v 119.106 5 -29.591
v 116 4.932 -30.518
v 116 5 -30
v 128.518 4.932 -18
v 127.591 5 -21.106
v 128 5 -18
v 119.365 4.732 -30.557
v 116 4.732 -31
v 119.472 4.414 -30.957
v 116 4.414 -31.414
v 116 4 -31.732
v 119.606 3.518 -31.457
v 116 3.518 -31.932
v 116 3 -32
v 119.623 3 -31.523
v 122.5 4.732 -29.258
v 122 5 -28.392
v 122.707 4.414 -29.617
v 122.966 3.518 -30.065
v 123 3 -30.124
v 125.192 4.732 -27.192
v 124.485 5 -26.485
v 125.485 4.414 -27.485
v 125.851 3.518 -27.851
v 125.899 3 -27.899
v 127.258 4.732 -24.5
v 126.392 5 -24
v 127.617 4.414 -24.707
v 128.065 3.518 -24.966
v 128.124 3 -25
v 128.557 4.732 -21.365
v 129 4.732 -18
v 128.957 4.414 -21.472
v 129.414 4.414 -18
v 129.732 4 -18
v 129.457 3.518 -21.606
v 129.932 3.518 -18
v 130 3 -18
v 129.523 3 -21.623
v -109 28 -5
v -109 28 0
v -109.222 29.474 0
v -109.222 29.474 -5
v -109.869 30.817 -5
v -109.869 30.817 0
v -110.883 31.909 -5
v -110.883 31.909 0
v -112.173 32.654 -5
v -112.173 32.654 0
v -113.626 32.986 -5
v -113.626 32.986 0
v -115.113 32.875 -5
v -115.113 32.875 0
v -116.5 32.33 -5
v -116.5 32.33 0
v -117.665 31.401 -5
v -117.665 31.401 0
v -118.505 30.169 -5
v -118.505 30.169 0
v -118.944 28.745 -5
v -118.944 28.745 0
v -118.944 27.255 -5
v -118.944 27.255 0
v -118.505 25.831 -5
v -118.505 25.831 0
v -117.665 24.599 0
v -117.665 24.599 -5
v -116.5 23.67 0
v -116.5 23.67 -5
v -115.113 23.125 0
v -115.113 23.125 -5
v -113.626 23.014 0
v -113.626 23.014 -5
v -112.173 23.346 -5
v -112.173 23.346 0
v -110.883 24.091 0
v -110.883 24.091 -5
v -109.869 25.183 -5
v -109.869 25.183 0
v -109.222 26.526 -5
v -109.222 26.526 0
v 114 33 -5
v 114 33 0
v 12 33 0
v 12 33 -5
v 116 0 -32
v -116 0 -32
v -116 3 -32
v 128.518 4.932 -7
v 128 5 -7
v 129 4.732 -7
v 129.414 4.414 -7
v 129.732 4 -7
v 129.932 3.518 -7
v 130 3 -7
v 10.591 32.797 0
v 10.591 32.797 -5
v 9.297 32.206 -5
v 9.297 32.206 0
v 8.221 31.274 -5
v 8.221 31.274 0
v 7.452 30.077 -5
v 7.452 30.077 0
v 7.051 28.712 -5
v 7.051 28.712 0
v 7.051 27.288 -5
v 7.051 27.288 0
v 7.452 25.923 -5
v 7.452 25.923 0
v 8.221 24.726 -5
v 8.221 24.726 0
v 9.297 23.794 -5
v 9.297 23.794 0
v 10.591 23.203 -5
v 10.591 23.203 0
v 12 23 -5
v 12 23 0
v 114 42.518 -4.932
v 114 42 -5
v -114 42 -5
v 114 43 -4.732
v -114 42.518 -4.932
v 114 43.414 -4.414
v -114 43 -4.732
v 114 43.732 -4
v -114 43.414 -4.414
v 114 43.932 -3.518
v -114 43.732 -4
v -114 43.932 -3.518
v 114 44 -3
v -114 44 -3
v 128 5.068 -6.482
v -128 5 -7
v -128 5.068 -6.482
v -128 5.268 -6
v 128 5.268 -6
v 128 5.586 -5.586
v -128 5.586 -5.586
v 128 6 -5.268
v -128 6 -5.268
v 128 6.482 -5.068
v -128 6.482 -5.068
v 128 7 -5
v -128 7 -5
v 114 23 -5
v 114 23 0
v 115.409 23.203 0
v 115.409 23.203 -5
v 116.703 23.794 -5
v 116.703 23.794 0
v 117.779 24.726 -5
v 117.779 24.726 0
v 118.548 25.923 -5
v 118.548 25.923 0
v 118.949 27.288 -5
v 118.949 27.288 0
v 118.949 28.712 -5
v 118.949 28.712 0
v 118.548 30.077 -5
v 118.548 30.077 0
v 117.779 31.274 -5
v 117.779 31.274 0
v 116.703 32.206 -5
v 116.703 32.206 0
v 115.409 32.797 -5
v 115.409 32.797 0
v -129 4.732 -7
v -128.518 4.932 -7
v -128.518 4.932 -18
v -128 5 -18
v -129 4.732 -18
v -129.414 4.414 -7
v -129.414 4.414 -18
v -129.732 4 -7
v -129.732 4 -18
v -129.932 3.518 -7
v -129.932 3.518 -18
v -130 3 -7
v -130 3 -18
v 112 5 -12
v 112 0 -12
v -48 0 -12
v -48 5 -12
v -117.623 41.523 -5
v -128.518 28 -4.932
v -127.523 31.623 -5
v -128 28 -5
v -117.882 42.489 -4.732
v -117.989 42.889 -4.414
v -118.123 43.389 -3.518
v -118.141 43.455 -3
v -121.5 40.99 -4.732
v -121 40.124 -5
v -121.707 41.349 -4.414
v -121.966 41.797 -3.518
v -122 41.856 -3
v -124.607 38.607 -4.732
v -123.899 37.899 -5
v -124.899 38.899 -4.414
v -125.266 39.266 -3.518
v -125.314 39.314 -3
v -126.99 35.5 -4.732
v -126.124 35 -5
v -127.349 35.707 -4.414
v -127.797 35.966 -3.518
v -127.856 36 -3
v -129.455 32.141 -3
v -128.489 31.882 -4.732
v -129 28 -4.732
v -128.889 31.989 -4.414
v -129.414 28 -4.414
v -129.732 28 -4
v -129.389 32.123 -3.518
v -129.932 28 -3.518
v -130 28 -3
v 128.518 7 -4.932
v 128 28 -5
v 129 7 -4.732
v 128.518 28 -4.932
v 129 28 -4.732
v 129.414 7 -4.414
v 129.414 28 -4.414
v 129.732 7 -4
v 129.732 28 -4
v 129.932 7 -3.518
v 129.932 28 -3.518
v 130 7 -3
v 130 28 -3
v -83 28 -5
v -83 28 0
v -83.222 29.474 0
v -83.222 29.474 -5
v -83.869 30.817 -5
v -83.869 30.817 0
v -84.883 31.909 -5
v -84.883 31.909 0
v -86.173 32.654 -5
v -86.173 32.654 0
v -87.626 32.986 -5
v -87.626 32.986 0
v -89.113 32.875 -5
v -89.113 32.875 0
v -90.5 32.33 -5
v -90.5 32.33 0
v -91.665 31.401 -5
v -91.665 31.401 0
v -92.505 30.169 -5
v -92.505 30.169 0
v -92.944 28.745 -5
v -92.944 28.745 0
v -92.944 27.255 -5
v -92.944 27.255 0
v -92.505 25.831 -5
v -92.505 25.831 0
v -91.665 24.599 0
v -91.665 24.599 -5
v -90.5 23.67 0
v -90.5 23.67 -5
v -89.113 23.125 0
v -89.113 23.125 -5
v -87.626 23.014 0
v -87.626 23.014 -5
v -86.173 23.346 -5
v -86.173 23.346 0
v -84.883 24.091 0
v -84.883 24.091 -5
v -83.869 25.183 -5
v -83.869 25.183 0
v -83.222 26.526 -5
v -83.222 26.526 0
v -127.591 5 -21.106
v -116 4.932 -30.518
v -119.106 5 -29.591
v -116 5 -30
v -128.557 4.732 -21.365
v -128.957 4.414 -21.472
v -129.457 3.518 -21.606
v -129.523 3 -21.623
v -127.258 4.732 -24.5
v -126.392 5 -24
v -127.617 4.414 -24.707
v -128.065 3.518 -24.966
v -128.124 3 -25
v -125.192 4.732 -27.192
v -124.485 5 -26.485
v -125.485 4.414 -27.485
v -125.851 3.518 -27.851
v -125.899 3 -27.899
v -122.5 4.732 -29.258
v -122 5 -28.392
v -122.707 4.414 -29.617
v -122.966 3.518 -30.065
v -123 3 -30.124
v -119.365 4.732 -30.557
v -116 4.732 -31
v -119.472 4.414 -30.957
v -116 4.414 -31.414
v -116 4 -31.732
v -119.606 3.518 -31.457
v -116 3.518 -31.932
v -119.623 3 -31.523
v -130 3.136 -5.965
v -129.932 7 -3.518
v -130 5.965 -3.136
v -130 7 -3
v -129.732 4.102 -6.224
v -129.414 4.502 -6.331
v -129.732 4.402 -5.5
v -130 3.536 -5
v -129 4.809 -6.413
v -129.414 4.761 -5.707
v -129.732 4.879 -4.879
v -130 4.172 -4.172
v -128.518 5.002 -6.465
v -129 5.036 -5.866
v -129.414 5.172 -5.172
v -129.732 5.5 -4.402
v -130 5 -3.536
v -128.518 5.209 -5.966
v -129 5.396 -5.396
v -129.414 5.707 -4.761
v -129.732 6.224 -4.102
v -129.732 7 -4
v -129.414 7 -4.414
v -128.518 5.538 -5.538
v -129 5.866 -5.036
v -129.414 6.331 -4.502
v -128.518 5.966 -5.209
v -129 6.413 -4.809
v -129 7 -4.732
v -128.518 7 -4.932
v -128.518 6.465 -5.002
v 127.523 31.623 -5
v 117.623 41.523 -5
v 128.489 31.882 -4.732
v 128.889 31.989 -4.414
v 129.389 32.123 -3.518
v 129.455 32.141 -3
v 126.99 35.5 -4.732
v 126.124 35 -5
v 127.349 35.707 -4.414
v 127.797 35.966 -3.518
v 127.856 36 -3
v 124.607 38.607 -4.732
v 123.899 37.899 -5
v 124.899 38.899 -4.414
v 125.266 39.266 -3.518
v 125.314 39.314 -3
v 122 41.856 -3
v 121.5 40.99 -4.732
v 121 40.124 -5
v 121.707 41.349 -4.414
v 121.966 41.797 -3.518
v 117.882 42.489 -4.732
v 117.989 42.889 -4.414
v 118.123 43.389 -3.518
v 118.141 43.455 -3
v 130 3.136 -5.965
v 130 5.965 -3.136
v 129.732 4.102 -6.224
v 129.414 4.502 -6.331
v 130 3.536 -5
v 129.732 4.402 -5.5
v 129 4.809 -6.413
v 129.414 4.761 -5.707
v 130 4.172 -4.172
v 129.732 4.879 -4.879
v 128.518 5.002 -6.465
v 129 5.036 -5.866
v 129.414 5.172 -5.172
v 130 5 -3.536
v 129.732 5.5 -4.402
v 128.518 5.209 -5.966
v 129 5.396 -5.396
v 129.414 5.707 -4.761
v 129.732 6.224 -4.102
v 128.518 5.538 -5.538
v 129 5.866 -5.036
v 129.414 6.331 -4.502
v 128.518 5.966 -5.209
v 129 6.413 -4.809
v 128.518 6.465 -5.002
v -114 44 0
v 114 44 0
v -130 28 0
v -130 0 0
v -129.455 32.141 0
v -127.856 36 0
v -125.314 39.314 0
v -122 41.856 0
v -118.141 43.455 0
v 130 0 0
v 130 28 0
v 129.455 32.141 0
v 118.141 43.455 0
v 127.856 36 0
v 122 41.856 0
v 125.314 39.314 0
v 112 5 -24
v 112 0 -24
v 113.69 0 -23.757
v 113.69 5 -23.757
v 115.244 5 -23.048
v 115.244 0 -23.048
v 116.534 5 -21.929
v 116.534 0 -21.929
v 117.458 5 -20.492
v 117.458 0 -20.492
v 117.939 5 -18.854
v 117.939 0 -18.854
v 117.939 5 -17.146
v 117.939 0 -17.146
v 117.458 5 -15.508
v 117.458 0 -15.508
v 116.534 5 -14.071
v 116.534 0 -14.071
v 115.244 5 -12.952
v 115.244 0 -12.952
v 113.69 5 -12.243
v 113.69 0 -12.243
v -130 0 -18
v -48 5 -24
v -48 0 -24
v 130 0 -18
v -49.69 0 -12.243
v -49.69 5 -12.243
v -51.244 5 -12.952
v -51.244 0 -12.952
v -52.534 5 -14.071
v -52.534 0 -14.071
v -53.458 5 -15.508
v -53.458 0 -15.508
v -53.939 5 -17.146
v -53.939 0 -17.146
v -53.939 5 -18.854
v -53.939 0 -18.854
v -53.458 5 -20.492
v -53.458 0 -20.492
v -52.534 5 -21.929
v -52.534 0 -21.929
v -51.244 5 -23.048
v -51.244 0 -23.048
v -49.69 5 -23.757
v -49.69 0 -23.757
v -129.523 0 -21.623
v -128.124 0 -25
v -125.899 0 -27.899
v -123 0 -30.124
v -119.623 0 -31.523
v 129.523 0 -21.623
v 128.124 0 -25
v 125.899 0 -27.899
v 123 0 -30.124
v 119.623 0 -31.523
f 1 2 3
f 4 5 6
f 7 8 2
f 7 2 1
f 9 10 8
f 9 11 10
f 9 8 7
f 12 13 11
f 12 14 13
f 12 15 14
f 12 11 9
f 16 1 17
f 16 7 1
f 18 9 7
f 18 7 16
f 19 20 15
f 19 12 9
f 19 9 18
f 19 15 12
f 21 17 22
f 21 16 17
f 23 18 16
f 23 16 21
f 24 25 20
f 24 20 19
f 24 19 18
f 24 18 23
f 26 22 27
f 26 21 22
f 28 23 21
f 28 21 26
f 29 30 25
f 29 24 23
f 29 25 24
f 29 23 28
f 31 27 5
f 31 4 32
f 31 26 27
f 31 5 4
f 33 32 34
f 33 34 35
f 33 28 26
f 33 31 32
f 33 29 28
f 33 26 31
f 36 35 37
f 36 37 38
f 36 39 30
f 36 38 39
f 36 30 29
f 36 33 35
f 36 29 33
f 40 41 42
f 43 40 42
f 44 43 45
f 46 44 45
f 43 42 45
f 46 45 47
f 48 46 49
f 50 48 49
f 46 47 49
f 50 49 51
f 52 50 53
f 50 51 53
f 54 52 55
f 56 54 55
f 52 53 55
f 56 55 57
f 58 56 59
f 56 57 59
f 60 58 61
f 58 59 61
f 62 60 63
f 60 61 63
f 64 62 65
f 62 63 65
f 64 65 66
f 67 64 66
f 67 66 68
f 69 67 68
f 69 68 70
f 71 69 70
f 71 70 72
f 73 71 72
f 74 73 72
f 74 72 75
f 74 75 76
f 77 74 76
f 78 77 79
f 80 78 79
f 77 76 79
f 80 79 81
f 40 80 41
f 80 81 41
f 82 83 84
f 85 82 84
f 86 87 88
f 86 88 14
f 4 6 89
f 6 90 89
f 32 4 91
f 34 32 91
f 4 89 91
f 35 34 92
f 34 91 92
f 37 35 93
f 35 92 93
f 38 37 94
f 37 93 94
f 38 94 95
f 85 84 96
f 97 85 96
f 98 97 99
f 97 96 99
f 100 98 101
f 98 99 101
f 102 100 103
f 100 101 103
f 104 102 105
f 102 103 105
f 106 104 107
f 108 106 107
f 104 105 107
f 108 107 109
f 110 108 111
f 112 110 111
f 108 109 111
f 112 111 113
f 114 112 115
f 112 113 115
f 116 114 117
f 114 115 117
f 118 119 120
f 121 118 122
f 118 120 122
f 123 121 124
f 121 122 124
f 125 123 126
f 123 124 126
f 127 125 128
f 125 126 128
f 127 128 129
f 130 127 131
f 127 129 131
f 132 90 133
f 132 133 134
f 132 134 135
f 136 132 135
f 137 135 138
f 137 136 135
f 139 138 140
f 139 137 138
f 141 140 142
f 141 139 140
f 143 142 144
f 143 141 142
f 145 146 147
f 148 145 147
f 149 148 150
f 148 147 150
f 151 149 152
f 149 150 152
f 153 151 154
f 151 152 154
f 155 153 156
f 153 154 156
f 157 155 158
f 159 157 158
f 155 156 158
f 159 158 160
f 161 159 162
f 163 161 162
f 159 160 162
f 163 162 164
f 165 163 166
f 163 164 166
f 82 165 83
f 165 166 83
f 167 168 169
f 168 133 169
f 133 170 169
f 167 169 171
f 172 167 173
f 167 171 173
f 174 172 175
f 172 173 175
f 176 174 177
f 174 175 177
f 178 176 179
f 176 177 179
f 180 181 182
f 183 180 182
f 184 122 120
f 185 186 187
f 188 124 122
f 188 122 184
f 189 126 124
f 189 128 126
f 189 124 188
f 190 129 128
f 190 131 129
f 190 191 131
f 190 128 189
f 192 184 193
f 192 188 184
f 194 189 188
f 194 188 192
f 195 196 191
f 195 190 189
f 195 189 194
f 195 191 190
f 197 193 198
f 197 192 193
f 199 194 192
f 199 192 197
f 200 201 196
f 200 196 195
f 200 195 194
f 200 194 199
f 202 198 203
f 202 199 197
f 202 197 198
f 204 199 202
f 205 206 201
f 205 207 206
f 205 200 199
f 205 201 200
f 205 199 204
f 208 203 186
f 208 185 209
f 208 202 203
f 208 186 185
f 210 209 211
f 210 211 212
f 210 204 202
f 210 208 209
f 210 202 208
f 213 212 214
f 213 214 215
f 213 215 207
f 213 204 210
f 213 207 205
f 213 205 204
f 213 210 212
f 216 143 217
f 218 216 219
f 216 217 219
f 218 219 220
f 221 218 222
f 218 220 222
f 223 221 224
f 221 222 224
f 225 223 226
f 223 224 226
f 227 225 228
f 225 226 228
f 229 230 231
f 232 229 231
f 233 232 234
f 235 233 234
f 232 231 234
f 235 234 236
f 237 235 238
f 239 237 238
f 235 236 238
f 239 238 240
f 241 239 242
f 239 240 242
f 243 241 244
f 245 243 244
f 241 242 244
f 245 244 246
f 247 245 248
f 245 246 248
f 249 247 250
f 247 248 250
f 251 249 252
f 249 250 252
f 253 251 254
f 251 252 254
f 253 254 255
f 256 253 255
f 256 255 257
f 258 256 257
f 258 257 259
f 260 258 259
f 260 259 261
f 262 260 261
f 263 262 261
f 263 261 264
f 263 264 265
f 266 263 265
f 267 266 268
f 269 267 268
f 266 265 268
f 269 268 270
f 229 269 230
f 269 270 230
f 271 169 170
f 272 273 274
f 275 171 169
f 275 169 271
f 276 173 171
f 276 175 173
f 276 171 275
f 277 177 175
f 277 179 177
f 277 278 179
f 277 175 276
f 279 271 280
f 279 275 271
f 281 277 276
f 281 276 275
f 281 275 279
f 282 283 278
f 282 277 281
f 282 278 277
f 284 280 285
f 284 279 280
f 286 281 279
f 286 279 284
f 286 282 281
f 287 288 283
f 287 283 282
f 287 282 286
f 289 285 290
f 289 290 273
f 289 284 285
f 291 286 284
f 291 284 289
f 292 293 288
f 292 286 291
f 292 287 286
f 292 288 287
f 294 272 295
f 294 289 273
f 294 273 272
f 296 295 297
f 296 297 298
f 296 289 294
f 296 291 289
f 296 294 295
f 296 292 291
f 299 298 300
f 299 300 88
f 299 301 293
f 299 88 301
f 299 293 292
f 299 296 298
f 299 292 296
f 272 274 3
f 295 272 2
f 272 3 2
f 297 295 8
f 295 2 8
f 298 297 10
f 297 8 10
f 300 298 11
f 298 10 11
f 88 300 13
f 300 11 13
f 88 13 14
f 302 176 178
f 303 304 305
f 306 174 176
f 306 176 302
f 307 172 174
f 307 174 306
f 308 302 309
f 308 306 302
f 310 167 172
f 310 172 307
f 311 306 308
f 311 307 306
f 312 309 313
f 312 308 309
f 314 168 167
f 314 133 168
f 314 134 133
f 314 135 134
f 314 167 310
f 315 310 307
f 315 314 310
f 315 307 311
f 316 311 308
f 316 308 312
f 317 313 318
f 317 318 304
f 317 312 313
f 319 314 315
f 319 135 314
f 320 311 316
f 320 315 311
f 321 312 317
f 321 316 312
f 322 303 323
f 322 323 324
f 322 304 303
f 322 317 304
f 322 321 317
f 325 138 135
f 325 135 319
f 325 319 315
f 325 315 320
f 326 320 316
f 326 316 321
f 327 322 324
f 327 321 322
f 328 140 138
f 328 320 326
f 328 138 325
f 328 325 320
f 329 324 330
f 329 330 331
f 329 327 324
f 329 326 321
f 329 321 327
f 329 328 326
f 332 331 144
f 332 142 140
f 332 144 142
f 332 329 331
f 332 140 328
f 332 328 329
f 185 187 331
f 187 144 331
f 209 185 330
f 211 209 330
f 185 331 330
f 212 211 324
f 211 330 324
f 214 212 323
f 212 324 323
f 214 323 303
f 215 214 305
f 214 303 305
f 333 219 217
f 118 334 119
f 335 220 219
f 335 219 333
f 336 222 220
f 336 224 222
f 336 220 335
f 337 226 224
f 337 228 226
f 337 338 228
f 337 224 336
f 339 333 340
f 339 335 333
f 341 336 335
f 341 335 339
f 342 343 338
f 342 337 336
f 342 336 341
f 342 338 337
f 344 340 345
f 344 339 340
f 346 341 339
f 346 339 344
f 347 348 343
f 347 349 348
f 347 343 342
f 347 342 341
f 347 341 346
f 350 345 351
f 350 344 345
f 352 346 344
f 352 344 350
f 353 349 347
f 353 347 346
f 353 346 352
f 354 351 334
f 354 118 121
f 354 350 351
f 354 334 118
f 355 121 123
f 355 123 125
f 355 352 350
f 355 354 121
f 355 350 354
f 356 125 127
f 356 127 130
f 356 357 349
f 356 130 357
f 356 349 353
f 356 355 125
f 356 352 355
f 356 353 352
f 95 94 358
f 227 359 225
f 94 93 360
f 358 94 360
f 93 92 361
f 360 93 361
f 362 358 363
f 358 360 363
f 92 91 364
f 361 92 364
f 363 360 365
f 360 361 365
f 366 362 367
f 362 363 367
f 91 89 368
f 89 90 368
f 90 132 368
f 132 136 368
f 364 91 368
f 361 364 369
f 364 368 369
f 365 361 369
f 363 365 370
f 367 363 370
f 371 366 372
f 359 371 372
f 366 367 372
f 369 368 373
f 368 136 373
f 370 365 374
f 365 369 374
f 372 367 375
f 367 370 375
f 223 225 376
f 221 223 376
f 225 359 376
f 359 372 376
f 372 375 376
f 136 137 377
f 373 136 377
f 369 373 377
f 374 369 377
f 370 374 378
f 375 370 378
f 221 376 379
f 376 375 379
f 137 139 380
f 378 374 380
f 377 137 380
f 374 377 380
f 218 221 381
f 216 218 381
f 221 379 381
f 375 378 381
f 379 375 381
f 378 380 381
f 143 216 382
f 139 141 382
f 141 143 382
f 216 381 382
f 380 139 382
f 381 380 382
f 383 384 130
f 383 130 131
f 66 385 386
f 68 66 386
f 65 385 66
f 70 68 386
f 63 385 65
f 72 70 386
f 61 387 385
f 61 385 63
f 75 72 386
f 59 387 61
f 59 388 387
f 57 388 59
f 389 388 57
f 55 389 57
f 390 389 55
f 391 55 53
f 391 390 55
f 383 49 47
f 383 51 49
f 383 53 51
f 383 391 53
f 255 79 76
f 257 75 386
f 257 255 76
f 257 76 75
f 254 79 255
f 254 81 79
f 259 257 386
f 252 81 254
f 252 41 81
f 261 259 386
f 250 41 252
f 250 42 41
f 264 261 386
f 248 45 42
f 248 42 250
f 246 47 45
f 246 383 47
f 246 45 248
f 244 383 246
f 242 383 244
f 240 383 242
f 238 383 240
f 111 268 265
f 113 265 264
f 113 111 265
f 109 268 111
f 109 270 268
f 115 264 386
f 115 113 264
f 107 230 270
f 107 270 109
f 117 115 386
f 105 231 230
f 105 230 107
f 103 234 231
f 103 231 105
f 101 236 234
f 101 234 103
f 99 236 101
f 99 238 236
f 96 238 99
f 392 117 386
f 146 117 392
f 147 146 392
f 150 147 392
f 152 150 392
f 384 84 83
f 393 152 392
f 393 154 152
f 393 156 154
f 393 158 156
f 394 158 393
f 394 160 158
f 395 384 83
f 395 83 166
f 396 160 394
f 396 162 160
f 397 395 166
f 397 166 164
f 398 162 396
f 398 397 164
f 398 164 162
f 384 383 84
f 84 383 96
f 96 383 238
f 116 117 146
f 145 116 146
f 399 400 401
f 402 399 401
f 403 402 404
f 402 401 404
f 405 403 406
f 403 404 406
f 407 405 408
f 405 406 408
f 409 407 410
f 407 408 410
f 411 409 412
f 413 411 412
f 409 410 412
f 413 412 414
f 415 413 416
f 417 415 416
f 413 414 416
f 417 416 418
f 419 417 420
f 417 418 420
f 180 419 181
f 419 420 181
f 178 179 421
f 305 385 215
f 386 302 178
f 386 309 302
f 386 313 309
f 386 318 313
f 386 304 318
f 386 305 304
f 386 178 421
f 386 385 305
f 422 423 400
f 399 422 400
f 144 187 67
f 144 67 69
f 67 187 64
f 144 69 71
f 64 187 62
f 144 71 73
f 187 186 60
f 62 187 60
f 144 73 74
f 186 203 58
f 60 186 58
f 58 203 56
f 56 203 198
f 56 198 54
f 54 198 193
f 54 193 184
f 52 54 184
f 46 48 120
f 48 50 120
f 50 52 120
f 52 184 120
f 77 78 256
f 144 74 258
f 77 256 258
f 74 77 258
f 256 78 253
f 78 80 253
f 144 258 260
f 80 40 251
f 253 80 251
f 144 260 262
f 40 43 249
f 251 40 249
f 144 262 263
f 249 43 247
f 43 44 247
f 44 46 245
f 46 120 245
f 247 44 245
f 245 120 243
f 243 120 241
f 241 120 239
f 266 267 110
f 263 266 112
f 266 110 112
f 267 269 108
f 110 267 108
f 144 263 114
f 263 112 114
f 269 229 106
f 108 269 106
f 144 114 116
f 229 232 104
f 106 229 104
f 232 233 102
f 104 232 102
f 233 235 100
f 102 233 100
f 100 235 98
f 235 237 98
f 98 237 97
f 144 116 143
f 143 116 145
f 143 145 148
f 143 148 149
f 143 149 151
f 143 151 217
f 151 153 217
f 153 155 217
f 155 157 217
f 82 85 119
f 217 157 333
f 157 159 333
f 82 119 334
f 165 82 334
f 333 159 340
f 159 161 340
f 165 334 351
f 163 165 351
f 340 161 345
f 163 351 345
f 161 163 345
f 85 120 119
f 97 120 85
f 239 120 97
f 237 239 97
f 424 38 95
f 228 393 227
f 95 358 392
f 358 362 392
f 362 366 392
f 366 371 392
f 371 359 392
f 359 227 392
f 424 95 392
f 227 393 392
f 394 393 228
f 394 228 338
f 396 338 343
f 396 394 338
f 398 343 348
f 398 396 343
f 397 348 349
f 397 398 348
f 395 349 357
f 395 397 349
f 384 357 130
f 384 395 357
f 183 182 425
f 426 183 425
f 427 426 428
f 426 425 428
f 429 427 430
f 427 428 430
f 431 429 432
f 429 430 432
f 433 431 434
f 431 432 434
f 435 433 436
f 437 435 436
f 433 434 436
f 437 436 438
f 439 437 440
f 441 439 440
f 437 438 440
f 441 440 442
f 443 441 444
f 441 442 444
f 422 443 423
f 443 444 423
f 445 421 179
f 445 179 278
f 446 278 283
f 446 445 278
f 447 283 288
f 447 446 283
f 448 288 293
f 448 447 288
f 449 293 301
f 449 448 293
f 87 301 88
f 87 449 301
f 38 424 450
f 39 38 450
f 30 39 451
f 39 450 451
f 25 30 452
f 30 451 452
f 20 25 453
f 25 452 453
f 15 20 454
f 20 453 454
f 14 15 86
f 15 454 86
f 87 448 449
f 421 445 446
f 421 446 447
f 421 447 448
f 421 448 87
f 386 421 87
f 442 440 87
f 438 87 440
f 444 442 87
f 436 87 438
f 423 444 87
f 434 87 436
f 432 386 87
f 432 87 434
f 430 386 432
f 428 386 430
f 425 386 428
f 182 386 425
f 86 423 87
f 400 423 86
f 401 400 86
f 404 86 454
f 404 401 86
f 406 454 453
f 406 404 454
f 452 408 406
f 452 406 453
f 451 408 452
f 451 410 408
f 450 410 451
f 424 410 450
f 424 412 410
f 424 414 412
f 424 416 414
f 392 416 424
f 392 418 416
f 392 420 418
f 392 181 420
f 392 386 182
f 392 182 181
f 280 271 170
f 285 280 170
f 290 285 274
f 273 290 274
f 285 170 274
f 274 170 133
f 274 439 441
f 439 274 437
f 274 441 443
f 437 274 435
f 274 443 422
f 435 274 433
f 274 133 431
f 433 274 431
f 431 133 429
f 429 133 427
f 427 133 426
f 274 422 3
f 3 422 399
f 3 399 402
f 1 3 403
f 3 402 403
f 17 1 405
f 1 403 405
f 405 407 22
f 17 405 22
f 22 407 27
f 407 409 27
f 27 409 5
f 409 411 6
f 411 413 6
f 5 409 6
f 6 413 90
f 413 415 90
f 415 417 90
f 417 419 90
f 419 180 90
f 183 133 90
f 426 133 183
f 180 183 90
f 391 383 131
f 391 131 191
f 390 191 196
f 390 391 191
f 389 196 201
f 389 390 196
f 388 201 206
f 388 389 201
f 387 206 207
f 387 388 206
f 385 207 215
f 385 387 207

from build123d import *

# Parameters (mm, degrees)
F1_DEPTH = 5
F2_R     = 5
F3_DEPTH = 5
F4_W     = 260
F4_H     = 5
F5_DEPTH = 27
F6_R     = 14
F8_DEPTH = 5
F9_R     = 2


with BuildPart() as f1:
    # F0 (on Top) → F1 (new body)
    with BuildSketch(Plane.XY):
        with BuildLine():
            Line((-130, 0), (130, 0))
            Line((130, 0), (130, 28))
            ThreePointArc((130, 28), (125.313708, 39.313708), (114, 44))
            Line((114, 44), (-114, 44))
            ThreePointArc((-114, 44), (-125.313708, 39.313708), (-130, 28))
            Line((-130, 28), (-130, 0))
        make_face()
    extrude(amount=-F1_DEPTH)

    # F2 (on face) → F3 (cut)
    with BuildSketch(Plane.XY):
        with BuildLine():
            Line((12, 23), (114, 23))
            ThreePointArc((114, 23), (119, 28), (114, 33))
            Line((114, 33), (12, 33))
            ThreePointArc((12, 33), (7, 28), (12, 23))
        make_face()
        with Locations((-88, 28)):
            Circle(F2_R)
        with Locations((-114, 28)):
            Circle(F2_R)
    extrude(amount=-F3_DEPTH, mode=Mode.SUBTRACT)

    # F4 (on face) → F5 (join)
    with BuildSketch(Plane(origin=(0, 0, -5), x_dir=(1, 0, 0), z_dir=(0, 0, -1))):
        with Locations((0, -2.5)):
            Rectangle(F4_W, F4_H)
    extrude(amount=F5_DEPTH)

    # F6
    f6_edges = [f1.edges().sort_by_distance(p)[0] for p in [
        (130, 2.5, -32),
        (-130, 2.5, -32),
    ]]
    fillet(f6_edges, radius=F6_R)

    # F7 (on face) → F8 (cut)
    with BuildSketch(Plane.XZ):
        with BuildLine():
            ThreePointArc((112, -24), (118, -18), (112, -12))
            Line((112, -12), (-48, -12))
            ThreePointArc((-48, -12), (-54, -18), (-48, -24))
            Line((-48, -24), (112, -24))
        make_face()
    extrude(amount=-F8_DEPTH, mode=Mode.SUBTRACT)

    # F9
    f9_edges = [f1.edges().sort_by_distance(p)[0] for p in [
        (0, 5, -32),
        (0, 44, -5),
        (0, 5, -5),
    ]]
    fillet(f9_edges, radius=F9_R)


solid = f1.part
